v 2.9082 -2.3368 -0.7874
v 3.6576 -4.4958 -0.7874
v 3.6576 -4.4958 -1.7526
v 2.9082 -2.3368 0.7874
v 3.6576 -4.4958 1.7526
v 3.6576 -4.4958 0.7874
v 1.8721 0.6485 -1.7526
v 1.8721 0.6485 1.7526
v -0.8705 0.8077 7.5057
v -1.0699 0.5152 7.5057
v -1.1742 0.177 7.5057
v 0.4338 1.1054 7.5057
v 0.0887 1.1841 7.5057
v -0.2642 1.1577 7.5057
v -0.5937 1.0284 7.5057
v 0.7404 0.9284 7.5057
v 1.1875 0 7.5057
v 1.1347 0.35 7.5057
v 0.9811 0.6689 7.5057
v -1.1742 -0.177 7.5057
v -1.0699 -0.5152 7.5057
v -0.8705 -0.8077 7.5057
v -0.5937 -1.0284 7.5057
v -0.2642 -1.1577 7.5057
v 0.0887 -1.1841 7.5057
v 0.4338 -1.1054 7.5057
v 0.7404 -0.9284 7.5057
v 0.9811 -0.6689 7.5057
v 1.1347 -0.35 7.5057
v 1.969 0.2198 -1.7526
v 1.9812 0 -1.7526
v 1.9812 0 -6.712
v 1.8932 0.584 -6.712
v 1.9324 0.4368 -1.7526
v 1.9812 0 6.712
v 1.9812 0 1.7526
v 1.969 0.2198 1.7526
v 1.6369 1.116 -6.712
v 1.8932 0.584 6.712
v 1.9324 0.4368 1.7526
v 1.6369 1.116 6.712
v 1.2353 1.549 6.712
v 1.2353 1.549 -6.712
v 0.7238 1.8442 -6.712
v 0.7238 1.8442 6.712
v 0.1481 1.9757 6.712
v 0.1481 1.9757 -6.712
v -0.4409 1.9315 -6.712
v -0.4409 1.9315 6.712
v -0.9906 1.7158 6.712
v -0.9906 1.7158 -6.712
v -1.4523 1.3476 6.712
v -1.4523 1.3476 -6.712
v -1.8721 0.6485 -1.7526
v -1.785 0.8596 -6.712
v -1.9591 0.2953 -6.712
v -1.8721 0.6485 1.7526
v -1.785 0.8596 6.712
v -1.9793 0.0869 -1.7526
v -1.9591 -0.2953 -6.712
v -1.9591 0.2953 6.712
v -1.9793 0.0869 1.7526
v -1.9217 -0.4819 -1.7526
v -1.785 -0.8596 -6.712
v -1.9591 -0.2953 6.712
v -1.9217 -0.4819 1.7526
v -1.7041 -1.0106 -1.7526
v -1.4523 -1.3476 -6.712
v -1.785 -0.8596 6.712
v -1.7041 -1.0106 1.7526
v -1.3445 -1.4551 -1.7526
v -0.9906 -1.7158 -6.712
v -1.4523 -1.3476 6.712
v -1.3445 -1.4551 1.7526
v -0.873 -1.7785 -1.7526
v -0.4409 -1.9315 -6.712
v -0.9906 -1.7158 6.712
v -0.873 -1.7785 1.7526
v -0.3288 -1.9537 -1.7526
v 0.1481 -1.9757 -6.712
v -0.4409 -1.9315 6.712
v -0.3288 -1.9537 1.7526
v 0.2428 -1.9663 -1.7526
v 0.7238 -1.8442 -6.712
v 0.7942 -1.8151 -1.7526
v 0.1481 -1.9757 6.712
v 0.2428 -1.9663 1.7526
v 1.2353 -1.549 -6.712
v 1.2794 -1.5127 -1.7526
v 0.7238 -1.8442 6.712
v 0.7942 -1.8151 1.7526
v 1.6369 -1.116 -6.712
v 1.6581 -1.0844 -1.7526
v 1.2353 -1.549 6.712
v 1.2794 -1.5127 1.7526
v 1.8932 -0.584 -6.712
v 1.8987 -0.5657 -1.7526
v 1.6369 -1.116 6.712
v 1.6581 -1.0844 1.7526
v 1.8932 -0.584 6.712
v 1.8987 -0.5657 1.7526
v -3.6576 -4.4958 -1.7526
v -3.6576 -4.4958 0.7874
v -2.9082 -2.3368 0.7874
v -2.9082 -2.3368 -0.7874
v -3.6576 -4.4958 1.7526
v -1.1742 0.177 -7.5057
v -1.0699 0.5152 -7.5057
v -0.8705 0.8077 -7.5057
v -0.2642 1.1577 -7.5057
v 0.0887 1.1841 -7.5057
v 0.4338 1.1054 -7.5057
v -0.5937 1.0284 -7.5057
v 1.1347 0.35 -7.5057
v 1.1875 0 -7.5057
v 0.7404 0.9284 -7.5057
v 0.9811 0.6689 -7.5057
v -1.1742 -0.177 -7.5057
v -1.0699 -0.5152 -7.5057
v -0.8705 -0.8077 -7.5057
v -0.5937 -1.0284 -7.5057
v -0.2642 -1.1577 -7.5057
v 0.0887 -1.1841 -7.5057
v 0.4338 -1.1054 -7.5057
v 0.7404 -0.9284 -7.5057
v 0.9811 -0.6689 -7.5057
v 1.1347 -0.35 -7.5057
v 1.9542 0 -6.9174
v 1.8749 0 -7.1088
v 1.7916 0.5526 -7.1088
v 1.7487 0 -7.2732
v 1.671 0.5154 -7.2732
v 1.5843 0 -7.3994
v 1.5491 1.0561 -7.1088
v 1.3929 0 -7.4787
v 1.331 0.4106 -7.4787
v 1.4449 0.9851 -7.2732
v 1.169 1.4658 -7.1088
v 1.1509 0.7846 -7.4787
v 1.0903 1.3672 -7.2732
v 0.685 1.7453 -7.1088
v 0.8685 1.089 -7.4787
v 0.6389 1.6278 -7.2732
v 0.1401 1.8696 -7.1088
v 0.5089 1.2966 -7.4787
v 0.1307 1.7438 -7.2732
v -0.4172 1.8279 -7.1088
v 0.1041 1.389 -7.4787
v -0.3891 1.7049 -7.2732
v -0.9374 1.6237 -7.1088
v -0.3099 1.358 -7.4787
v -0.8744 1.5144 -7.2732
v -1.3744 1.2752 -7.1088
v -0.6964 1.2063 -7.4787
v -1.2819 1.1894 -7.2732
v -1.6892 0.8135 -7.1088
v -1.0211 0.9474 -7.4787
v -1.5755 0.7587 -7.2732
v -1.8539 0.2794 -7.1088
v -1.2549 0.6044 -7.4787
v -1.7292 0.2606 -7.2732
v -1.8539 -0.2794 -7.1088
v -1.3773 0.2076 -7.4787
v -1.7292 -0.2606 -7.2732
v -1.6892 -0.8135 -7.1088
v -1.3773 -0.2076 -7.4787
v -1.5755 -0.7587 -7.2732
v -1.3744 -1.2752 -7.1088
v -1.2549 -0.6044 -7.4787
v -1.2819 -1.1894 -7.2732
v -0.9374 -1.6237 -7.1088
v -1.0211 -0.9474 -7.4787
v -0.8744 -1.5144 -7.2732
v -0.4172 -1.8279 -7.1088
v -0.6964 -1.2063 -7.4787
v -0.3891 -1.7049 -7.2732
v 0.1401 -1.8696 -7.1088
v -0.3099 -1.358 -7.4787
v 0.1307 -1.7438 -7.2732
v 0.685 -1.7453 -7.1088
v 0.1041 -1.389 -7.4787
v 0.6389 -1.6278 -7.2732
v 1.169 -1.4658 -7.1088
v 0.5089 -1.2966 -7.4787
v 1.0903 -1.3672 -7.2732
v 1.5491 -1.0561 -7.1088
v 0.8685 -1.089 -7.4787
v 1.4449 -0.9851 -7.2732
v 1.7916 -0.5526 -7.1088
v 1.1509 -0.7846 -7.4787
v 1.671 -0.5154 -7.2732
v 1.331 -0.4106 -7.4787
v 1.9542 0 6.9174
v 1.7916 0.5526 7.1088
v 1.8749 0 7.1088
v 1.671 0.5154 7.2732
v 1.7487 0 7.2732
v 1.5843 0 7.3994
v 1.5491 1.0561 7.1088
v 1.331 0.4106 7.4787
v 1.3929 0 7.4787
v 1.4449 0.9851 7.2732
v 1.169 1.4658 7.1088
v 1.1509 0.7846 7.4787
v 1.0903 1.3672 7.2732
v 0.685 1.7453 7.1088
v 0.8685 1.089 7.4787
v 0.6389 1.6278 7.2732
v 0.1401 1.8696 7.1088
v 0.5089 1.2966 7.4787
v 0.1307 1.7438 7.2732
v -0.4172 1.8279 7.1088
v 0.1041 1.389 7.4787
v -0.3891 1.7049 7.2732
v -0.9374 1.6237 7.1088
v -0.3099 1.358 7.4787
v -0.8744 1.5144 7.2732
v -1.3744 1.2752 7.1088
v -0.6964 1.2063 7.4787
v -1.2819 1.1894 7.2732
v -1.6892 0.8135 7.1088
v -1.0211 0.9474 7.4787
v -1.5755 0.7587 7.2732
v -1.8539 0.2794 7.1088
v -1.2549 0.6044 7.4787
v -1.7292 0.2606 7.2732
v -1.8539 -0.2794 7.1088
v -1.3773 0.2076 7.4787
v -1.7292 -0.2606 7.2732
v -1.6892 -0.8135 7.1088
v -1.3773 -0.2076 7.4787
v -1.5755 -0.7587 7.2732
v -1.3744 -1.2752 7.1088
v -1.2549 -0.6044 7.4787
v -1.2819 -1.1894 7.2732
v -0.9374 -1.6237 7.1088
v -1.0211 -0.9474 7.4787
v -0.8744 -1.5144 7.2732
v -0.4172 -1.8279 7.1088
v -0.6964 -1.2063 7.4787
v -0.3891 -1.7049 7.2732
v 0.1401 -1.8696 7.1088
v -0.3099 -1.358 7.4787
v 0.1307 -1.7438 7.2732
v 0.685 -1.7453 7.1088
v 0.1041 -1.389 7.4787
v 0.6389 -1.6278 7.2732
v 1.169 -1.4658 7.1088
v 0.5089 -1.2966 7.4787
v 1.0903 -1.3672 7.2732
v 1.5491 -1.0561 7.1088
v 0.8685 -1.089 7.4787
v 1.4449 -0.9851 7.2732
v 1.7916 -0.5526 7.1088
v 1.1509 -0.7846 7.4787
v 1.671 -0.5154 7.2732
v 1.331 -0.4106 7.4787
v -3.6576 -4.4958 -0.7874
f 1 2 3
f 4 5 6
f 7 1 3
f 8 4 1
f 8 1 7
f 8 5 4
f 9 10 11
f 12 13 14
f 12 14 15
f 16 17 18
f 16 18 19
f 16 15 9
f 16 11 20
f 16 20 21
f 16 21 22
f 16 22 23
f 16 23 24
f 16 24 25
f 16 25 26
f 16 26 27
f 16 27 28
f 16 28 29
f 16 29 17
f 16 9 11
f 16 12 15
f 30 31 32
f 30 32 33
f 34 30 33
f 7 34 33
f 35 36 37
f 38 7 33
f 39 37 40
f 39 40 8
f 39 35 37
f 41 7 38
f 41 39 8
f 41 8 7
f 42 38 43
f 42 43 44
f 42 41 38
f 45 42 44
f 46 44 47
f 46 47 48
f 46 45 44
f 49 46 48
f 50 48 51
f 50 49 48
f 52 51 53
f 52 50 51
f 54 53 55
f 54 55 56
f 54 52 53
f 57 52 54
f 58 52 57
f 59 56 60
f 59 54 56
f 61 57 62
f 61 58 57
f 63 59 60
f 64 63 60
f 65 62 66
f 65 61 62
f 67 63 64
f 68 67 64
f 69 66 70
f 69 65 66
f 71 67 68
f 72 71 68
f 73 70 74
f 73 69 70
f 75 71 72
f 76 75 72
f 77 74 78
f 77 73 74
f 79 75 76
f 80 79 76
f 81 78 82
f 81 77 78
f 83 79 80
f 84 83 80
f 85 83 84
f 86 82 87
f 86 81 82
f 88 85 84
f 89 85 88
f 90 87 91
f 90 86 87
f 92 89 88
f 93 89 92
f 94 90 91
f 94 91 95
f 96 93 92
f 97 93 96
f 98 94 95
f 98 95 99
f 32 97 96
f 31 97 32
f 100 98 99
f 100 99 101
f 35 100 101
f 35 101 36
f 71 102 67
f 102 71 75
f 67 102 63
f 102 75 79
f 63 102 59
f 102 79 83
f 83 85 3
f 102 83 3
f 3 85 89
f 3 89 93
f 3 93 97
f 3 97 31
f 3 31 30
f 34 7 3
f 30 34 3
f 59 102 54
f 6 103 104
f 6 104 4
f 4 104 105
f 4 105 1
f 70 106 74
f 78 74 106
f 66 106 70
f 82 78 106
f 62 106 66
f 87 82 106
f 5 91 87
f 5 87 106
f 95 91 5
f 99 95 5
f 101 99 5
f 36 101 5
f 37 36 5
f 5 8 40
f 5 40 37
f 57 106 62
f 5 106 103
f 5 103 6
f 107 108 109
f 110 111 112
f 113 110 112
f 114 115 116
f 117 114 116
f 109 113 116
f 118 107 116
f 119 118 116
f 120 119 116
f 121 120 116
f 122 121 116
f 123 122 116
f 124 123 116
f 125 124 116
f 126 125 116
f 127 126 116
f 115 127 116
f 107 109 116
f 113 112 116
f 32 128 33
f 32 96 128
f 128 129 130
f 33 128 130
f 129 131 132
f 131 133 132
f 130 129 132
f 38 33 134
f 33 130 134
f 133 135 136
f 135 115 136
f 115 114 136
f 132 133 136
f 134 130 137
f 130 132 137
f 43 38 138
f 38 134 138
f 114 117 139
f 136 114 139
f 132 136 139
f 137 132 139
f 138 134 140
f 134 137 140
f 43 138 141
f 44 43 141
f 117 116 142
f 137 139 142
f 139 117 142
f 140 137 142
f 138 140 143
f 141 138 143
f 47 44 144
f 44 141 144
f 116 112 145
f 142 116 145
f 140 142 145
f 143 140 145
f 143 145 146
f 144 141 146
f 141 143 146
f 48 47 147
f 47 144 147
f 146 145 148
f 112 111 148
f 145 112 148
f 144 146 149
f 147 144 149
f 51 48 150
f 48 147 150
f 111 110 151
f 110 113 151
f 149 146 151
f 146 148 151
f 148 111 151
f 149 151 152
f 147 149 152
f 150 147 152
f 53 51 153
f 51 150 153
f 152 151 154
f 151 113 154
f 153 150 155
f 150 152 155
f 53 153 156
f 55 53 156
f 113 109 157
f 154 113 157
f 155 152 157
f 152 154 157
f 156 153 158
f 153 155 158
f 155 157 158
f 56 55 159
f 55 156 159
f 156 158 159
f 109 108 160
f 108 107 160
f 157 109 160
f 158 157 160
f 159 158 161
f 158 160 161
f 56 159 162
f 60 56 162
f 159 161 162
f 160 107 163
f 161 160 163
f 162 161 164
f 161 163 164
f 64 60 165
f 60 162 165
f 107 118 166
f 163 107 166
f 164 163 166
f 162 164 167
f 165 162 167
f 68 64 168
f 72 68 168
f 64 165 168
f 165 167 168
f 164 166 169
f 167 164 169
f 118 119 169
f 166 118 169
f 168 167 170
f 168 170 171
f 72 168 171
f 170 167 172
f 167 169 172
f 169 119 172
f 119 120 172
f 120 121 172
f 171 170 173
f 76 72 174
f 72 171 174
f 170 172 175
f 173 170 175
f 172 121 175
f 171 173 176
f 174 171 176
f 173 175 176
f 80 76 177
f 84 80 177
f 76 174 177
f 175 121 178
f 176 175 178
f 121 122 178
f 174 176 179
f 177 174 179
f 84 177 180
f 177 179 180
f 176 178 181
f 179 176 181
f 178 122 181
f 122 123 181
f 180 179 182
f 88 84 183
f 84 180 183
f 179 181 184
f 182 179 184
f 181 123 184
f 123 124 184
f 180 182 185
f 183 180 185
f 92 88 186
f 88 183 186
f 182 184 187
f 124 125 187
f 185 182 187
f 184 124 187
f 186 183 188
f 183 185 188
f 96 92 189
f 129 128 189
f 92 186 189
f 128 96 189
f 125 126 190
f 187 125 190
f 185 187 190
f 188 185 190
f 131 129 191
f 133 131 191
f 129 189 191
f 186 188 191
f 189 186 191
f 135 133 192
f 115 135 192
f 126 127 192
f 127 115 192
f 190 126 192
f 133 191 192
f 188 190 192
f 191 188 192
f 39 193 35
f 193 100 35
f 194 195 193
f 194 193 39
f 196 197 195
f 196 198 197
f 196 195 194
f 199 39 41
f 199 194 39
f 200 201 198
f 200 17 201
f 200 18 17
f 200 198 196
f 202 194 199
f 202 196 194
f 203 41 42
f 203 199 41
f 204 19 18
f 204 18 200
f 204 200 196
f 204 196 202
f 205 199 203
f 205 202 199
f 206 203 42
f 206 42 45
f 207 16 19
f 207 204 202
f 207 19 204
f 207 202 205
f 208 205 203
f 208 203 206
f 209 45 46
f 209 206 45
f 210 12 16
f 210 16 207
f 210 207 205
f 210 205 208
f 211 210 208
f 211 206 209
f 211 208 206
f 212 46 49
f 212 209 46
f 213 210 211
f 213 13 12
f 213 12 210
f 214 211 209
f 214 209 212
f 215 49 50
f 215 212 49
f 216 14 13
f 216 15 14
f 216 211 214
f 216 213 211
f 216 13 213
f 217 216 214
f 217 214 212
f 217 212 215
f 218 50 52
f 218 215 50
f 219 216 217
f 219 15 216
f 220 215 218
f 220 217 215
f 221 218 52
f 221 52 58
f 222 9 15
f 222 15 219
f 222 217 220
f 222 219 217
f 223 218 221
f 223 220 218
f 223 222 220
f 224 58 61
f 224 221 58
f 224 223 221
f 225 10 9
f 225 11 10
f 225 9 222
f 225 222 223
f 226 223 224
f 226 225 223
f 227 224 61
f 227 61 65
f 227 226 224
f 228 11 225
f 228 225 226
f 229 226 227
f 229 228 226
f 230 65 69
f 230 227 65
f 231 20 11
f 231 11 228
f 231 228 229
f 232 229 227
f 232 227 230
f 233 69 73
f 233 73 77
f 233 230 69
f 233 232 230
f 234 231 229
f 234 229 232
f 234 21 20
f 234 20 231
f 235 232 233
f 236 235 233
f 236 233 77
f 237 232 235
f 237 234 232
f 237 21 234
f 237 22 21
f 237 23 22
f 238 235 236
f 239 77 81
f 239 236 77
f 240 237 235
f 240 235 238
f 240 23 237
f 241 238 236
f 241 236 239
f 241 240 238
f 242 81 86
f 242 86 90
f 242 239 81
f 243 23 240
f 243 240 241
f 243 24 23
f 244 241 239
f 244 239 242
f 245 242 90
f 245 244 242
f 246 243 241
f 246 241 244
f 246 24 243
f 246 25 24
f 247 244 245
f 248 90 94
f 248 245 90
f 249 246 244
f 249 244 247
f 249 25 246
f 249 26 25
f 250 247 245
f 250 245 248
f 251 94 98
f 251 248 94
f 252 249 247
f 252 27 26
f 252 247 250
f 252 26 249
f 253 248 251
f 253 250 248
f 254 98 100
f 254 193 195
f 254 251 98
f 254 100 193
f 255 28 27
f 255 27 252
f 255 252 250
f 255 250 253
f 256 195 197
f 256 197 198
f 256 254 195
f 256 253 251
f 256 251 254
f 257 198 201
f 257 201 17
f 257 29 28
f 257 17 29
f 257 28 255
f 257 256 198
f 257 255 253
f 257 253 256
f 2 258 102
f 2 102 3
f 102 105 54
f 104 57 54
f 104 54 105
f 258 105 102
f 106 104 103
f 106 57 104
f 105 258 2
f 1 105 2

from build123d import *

# Parameters (mm, degrees)
F0_R     = 1.9812
F1_DEPTH = 7.5057
F3_DEPTH = 1.7526
F4_W     = 7.3152
F4_H     = 1.5748
F5_DEPTH = 2.159
F6_R     = 0.79375


with BuildPart() as f1:
    # F0 (on Top) → F1 (new body, symmetric)
    with BuildSketch(Plane.XY):
        Circle(F0_R)
    extrude(amount=F1_DEPTH, both=True)

    # F2 (on Top) → F3 (join, symmetric)
    with BuildSketch(Plane.XY):
        Polygon((1.871663, 0.649638), (-1.871663, 0.649638), (-3.6576, -4.4958), (0, -4.4958), (3.6576, -4.4958), align=None)
    extrude(amount=F3_DEPTH, both=True)

    # F4 (on face) → F5 (cut)
    with BuildSketch(Plane.XZ.offset(4.4958)):
        Rectangle(F4_W, F4_H)
    extrude(amount=-F5_DEPTH, mode=Mode.SUBTRACT)

    # F6
    f6_edges = [f1.edges().sort_by_distance(p)[0] for p in [
        (-1.9812, 0, 7.5057),
        (-1.9812, 0, -7.5057),
    ]]
    fillet(f6_edges, radius=F6_R)


solid = f1.part
